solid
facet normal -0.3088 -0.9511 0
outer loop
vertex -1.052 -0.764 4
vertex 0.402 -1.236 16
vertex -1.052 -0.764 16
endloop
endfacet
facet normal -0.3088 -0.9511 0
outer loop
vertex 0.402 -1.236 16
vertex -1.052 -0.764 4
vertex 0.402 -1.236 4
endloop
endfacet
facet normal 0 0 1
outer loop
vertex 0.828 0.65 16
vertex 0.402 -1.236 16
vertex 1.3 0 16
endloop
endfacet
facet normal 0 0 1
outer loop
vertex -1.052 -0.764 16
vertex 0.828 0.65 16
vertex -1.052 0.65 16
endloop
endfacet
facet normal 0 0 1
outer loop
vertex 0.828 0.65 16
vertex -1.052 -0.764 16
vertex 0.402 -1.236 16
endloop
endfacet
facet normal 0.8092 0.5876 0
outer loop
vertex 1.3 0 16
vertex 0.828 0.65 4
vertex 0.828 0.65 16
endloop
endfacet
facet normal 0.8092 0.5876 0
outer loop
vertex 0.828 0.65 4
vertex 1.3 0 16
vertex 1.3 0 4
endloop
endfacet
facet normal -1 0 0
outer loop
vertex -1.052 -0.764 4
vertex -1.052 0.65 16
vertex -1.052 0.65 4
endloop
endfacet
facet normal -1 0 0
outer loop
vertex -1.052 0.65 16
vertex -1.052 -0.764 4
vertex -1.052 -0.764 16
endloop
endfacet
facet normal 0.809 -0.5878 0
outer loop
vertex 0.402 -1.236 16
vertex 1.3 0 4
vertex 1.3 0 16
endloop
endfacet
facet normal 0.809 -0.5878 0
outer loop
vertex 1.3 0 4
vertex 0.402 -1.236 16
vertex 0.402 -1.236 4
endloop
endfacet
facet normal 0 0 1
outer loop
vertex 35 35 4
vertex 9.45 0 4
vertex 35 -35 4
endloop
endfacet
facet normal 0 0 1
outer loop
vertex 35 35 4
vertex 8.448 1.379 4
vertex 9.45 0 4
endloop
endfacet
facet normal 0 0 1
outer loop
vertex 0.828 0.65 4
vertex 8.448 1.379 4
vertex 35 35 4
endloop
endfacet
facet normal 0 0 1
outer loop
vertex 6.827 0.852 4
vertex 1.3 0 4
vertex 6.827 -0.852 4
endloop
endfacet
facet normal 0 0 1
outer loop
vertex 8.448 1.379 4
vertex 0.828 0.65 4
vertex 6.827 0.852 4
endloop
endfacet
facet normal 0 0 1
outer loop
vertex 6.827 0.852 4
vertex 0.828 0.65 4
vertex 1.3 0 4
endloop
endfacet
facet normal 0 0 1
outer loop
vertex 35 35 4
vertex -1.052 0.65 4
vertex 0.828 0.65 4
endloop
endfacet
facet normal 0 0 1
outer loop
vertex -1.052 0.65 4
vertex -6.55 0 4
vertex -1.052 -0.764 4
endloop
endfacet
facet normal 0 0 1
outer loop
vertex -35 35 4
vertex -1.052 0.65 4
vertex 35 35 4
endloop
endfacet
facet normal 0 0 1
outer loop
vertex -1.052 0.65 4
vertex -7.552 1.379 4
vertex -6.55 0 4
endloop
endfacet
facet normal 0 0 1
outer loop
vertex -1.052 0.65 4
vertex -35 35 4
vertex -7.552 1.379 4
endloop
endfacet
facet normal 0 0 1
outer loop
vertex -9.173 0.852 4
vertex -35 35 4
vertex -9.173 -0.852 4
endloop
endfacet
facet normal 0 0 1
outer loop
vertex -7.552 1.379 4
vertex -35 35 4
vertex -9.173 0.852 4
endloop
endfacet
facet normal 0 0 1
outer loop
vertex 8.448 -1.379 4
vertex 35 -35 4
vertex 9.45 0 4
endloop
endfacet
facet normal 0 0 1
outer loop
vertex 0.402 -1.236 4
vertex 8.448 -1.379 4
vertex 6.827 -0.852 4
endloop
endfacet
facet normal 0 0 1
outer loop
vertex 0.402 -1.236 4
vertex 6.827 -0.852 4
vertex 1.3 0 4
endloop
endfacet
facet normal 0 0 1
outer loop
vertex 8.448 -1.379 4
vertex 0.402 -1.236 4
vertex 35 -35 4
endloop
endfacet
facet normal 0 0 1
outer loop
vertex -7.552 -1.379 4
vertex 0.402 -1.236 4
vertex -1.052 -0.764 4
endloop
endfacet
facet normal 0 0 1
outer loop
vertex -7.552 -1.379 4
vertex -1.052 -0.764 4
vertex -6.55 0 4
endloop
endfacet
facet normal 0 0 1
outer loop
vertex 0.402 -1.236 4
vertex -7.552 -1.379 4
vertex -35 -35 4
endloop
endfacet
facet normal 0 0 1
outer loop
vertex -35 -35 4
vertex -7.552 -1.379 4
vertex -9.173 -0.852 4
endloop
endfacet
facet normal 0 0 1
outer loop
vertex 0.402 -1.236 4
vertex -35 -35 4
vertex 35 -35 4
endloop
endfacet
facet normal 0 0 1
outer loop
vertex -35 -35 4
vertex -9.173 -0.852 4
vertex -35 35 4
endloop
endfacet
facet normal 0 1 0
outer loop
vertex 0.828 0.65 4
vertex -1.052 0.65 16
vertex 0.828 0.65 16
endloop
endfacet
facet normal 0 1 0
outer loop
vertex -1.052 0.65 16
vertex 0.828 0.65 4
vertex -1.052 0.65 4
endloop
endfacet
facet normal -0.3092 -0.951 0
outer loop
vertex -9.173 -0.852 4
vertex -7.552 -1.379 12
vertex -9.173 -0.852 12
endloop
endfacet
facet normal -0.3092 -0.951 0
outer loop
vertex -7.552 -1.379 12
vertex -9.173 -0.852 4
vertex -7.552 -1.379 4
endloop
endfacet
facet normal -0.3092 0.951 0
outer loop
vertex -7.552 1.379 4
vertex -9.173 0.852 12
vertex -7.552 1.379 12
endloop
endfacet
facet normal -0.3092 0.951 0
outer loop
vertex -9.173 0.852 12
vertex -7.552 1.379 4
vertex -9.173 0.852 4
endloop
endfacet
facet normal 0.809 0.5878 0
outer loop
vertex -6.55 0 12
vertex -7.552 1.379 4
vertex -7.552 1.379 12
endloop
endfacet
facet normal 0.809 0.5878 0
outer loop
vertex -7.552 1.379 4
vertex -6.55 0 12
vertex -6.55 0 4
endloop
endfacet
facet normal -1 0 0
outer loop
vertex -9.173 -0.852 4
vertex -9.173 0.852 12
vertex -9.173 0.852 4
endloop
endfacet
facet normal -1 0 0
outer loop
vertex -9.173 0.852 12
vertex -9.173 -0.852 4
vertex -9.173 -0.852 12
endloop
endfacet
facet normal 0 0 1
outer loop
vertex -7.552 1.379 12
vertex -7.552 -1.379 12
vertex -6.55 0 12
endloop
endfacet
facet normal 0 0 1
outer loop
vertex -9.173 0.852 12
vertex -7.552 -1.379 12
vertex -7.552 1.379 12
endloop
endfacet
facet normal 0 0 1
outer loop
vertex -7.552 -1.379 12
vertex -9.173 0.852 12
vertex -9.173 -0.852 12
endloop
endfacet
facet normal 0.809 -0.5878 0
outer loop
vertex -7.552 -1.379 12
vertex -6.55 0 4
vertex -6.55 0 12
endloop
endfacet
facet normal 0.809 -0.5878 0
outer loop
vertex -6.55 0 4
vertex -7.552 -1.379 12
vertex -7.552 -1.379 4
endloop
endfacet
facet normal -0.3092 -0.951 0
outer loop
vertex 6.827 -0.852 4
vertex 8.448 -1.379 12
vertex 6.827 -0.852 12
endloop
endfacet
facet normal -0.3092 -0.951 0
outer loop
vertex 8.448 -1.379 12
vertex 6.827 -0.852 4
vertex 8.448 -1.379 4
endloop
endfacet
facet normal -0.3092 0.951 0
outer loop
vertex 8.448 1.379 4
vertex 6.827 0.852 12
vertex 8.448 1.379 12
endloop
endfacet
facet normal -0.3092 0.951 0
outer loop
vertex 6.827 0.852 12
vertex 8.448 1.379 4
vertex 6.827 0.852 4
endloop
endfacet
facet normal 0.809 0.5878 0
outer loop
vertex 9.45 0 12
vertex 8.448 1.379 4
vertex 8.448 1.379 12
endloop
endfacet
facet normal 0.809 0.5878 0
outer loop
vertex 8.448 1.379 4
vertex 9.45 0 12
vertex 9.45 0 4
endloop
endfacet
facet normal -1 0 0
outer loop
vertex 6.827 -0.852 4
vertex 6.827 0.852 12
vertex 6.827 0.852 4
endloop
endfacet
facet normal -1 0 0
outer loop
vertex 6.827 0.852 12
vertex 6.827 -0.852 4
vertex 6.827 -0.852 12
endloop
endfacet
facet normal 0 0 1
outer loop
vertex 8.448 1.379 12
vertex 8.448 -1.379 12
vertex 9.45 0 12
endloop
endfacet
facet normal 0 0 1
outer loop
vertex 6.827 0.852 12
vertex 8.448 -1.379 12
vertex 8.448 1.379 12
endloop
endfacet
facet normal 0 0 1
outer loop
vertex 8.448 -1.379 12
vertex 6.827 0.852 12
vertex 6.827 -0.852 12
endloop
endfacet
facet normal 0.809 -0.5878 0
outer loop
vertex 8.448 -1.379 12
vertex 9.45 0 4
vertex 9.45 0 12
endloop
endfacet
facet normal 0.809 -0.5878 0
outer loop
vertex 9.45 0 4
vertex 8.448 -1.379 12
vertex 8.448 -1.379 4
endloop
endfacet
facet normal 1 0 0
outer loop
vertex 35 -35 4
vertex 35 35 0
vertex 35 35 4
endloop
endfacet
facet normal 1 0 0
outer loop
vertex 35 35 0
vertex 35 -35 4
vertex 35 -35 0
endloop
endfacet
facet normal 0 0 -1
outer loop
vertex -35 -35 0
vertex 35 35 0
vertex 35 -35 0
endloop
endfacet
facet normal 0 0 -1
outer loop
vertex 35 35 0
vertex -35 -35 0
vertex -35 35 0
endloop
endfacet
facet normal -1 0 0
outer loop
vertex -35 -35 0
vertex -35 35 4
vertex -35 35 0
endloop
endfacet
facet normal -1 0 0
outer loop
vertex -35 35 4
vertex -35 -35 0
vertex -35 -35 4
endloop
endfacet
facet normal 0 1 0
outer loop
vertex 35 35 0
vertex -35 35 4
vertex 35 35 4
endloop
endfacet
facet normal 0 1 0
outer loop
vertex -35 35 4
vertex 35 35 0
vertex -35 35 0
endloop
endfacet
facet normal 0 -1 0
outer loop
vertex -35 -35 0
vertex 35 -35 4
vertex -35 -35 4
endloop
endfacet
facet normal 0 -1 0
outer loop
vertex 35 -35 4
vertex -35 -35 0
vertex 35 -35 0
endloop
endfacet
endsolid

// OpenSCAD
// Fit-Check Jig — Mop Disk hub (RS385 interface)
// ===============================================
//
// Purpose:
//   1. Verify the mop disk's D-bore (Φ2.3, D-flat width ≈1.8) slides onto the
//      RS385 motor shaft and indexes on the flat (datasheet: RS385).
//   2. Verify the two M2.5 mounting holes at 16 mm pitch align with the
//      RS385 motor face holes (datasheet: RS385).
//   3. Dry-fit the mop pad backing on the printed boss (∅40 mm, estimate) —
//      confirm the pad size and boss fit before a full disk print.
//
// This jig prints a flat plate replicating the RS385 motor FACE and SHAFT as
// POSITIVE features: an 8 mm boss with a D-shape representing the shaft, and
// two M2.5 guide pegs at 16 mm pitch. Slide the printed/actual disk over it.
//
// Sources:
//   - RS385 shaft/hole pitch: Foneacc RS385 datasheet (via mop-assembly branch)
//   - Boss diameter ∅40: estimate, tune to your pad
// Licensed CC0.

// ===== PARAMETERS =====
rs385_shaft_dia   = 2.3;    // mm (datasheet: RS385)
rs385_flat_width  = 1.8;    // mm (datasheet: RS385) D-flat location (from centre to flat ≈ half dia minus flat depth)
rs385_hole_pitch  = 16.0;   // mm (datasheet: RS385)
rs385_hole_dia    = 2.6;    // mm (estimate) M2.5 peg diameter
boss_dia          = 40.0;   // mm (estimate) pad-retention boss, must match disk

// ---- Jig tuning ----
plate_x           = 70.0;   // mm
plate_y           = 70.0;
plate_z           = 4.0;    // mm, base thickness
shaft_proj_h      = 12.0;   // mm, shaft replica height (taller than disk hub so it's graspable)
peg_h             = 8.0;    // mm, mounting-hole pegs height
clearance         = 0.3;    // mm, peg/feature slip allowance

// ===== MODULES =====
module base_plate() {
    translate([-plate_x / 2, -plate_y / 2, 0])
        color("#dddddd")
        cube([plate_x, plate_y, plate_z]);
}

module shaft_replica() {
    // D-shaped shaft replica (positive). The D: a cylinder with a chord cut.
    color("#aaaaaa")
    translate([0, 0, plate_z])
    difference() {
        cylinder(d = rs385_shaft_dia + clearance, h = shaft_proj_h);
        // chord cut on the +Y side to represent the flat
        translate([-rs385_shaft_dia, rs385_flat_width - (rs385_shaft_dia / 2), -0.1])
            cube([2 * rs385_shaft_dia, rs385_shaft_dia, shaft_proj_h + 0.2]);
    }
}

module mounting_pegs() {
    for (x = [-rs385_hole_pitch / 2, rs385_hole_pitch / 2])
        translate([x, 0, plate_z])
            color("#aaaaaa")
            cylinder(d = rs385_hole_dia + clearance, h = peg_h);
}

module boss_pocket() {
    // A shallow circular reference marking the pad-boss footprint on the base
    translate([0, 0, -0.1])
        cylinder(d = boss_dia, h = plate_z + 0.2, $fn = 96);
}

module jig_mop_disk_hub() {
    base_plate();
    shaft_replica();
    mounting_pegs();
}

jig_mop_disk_hub();
